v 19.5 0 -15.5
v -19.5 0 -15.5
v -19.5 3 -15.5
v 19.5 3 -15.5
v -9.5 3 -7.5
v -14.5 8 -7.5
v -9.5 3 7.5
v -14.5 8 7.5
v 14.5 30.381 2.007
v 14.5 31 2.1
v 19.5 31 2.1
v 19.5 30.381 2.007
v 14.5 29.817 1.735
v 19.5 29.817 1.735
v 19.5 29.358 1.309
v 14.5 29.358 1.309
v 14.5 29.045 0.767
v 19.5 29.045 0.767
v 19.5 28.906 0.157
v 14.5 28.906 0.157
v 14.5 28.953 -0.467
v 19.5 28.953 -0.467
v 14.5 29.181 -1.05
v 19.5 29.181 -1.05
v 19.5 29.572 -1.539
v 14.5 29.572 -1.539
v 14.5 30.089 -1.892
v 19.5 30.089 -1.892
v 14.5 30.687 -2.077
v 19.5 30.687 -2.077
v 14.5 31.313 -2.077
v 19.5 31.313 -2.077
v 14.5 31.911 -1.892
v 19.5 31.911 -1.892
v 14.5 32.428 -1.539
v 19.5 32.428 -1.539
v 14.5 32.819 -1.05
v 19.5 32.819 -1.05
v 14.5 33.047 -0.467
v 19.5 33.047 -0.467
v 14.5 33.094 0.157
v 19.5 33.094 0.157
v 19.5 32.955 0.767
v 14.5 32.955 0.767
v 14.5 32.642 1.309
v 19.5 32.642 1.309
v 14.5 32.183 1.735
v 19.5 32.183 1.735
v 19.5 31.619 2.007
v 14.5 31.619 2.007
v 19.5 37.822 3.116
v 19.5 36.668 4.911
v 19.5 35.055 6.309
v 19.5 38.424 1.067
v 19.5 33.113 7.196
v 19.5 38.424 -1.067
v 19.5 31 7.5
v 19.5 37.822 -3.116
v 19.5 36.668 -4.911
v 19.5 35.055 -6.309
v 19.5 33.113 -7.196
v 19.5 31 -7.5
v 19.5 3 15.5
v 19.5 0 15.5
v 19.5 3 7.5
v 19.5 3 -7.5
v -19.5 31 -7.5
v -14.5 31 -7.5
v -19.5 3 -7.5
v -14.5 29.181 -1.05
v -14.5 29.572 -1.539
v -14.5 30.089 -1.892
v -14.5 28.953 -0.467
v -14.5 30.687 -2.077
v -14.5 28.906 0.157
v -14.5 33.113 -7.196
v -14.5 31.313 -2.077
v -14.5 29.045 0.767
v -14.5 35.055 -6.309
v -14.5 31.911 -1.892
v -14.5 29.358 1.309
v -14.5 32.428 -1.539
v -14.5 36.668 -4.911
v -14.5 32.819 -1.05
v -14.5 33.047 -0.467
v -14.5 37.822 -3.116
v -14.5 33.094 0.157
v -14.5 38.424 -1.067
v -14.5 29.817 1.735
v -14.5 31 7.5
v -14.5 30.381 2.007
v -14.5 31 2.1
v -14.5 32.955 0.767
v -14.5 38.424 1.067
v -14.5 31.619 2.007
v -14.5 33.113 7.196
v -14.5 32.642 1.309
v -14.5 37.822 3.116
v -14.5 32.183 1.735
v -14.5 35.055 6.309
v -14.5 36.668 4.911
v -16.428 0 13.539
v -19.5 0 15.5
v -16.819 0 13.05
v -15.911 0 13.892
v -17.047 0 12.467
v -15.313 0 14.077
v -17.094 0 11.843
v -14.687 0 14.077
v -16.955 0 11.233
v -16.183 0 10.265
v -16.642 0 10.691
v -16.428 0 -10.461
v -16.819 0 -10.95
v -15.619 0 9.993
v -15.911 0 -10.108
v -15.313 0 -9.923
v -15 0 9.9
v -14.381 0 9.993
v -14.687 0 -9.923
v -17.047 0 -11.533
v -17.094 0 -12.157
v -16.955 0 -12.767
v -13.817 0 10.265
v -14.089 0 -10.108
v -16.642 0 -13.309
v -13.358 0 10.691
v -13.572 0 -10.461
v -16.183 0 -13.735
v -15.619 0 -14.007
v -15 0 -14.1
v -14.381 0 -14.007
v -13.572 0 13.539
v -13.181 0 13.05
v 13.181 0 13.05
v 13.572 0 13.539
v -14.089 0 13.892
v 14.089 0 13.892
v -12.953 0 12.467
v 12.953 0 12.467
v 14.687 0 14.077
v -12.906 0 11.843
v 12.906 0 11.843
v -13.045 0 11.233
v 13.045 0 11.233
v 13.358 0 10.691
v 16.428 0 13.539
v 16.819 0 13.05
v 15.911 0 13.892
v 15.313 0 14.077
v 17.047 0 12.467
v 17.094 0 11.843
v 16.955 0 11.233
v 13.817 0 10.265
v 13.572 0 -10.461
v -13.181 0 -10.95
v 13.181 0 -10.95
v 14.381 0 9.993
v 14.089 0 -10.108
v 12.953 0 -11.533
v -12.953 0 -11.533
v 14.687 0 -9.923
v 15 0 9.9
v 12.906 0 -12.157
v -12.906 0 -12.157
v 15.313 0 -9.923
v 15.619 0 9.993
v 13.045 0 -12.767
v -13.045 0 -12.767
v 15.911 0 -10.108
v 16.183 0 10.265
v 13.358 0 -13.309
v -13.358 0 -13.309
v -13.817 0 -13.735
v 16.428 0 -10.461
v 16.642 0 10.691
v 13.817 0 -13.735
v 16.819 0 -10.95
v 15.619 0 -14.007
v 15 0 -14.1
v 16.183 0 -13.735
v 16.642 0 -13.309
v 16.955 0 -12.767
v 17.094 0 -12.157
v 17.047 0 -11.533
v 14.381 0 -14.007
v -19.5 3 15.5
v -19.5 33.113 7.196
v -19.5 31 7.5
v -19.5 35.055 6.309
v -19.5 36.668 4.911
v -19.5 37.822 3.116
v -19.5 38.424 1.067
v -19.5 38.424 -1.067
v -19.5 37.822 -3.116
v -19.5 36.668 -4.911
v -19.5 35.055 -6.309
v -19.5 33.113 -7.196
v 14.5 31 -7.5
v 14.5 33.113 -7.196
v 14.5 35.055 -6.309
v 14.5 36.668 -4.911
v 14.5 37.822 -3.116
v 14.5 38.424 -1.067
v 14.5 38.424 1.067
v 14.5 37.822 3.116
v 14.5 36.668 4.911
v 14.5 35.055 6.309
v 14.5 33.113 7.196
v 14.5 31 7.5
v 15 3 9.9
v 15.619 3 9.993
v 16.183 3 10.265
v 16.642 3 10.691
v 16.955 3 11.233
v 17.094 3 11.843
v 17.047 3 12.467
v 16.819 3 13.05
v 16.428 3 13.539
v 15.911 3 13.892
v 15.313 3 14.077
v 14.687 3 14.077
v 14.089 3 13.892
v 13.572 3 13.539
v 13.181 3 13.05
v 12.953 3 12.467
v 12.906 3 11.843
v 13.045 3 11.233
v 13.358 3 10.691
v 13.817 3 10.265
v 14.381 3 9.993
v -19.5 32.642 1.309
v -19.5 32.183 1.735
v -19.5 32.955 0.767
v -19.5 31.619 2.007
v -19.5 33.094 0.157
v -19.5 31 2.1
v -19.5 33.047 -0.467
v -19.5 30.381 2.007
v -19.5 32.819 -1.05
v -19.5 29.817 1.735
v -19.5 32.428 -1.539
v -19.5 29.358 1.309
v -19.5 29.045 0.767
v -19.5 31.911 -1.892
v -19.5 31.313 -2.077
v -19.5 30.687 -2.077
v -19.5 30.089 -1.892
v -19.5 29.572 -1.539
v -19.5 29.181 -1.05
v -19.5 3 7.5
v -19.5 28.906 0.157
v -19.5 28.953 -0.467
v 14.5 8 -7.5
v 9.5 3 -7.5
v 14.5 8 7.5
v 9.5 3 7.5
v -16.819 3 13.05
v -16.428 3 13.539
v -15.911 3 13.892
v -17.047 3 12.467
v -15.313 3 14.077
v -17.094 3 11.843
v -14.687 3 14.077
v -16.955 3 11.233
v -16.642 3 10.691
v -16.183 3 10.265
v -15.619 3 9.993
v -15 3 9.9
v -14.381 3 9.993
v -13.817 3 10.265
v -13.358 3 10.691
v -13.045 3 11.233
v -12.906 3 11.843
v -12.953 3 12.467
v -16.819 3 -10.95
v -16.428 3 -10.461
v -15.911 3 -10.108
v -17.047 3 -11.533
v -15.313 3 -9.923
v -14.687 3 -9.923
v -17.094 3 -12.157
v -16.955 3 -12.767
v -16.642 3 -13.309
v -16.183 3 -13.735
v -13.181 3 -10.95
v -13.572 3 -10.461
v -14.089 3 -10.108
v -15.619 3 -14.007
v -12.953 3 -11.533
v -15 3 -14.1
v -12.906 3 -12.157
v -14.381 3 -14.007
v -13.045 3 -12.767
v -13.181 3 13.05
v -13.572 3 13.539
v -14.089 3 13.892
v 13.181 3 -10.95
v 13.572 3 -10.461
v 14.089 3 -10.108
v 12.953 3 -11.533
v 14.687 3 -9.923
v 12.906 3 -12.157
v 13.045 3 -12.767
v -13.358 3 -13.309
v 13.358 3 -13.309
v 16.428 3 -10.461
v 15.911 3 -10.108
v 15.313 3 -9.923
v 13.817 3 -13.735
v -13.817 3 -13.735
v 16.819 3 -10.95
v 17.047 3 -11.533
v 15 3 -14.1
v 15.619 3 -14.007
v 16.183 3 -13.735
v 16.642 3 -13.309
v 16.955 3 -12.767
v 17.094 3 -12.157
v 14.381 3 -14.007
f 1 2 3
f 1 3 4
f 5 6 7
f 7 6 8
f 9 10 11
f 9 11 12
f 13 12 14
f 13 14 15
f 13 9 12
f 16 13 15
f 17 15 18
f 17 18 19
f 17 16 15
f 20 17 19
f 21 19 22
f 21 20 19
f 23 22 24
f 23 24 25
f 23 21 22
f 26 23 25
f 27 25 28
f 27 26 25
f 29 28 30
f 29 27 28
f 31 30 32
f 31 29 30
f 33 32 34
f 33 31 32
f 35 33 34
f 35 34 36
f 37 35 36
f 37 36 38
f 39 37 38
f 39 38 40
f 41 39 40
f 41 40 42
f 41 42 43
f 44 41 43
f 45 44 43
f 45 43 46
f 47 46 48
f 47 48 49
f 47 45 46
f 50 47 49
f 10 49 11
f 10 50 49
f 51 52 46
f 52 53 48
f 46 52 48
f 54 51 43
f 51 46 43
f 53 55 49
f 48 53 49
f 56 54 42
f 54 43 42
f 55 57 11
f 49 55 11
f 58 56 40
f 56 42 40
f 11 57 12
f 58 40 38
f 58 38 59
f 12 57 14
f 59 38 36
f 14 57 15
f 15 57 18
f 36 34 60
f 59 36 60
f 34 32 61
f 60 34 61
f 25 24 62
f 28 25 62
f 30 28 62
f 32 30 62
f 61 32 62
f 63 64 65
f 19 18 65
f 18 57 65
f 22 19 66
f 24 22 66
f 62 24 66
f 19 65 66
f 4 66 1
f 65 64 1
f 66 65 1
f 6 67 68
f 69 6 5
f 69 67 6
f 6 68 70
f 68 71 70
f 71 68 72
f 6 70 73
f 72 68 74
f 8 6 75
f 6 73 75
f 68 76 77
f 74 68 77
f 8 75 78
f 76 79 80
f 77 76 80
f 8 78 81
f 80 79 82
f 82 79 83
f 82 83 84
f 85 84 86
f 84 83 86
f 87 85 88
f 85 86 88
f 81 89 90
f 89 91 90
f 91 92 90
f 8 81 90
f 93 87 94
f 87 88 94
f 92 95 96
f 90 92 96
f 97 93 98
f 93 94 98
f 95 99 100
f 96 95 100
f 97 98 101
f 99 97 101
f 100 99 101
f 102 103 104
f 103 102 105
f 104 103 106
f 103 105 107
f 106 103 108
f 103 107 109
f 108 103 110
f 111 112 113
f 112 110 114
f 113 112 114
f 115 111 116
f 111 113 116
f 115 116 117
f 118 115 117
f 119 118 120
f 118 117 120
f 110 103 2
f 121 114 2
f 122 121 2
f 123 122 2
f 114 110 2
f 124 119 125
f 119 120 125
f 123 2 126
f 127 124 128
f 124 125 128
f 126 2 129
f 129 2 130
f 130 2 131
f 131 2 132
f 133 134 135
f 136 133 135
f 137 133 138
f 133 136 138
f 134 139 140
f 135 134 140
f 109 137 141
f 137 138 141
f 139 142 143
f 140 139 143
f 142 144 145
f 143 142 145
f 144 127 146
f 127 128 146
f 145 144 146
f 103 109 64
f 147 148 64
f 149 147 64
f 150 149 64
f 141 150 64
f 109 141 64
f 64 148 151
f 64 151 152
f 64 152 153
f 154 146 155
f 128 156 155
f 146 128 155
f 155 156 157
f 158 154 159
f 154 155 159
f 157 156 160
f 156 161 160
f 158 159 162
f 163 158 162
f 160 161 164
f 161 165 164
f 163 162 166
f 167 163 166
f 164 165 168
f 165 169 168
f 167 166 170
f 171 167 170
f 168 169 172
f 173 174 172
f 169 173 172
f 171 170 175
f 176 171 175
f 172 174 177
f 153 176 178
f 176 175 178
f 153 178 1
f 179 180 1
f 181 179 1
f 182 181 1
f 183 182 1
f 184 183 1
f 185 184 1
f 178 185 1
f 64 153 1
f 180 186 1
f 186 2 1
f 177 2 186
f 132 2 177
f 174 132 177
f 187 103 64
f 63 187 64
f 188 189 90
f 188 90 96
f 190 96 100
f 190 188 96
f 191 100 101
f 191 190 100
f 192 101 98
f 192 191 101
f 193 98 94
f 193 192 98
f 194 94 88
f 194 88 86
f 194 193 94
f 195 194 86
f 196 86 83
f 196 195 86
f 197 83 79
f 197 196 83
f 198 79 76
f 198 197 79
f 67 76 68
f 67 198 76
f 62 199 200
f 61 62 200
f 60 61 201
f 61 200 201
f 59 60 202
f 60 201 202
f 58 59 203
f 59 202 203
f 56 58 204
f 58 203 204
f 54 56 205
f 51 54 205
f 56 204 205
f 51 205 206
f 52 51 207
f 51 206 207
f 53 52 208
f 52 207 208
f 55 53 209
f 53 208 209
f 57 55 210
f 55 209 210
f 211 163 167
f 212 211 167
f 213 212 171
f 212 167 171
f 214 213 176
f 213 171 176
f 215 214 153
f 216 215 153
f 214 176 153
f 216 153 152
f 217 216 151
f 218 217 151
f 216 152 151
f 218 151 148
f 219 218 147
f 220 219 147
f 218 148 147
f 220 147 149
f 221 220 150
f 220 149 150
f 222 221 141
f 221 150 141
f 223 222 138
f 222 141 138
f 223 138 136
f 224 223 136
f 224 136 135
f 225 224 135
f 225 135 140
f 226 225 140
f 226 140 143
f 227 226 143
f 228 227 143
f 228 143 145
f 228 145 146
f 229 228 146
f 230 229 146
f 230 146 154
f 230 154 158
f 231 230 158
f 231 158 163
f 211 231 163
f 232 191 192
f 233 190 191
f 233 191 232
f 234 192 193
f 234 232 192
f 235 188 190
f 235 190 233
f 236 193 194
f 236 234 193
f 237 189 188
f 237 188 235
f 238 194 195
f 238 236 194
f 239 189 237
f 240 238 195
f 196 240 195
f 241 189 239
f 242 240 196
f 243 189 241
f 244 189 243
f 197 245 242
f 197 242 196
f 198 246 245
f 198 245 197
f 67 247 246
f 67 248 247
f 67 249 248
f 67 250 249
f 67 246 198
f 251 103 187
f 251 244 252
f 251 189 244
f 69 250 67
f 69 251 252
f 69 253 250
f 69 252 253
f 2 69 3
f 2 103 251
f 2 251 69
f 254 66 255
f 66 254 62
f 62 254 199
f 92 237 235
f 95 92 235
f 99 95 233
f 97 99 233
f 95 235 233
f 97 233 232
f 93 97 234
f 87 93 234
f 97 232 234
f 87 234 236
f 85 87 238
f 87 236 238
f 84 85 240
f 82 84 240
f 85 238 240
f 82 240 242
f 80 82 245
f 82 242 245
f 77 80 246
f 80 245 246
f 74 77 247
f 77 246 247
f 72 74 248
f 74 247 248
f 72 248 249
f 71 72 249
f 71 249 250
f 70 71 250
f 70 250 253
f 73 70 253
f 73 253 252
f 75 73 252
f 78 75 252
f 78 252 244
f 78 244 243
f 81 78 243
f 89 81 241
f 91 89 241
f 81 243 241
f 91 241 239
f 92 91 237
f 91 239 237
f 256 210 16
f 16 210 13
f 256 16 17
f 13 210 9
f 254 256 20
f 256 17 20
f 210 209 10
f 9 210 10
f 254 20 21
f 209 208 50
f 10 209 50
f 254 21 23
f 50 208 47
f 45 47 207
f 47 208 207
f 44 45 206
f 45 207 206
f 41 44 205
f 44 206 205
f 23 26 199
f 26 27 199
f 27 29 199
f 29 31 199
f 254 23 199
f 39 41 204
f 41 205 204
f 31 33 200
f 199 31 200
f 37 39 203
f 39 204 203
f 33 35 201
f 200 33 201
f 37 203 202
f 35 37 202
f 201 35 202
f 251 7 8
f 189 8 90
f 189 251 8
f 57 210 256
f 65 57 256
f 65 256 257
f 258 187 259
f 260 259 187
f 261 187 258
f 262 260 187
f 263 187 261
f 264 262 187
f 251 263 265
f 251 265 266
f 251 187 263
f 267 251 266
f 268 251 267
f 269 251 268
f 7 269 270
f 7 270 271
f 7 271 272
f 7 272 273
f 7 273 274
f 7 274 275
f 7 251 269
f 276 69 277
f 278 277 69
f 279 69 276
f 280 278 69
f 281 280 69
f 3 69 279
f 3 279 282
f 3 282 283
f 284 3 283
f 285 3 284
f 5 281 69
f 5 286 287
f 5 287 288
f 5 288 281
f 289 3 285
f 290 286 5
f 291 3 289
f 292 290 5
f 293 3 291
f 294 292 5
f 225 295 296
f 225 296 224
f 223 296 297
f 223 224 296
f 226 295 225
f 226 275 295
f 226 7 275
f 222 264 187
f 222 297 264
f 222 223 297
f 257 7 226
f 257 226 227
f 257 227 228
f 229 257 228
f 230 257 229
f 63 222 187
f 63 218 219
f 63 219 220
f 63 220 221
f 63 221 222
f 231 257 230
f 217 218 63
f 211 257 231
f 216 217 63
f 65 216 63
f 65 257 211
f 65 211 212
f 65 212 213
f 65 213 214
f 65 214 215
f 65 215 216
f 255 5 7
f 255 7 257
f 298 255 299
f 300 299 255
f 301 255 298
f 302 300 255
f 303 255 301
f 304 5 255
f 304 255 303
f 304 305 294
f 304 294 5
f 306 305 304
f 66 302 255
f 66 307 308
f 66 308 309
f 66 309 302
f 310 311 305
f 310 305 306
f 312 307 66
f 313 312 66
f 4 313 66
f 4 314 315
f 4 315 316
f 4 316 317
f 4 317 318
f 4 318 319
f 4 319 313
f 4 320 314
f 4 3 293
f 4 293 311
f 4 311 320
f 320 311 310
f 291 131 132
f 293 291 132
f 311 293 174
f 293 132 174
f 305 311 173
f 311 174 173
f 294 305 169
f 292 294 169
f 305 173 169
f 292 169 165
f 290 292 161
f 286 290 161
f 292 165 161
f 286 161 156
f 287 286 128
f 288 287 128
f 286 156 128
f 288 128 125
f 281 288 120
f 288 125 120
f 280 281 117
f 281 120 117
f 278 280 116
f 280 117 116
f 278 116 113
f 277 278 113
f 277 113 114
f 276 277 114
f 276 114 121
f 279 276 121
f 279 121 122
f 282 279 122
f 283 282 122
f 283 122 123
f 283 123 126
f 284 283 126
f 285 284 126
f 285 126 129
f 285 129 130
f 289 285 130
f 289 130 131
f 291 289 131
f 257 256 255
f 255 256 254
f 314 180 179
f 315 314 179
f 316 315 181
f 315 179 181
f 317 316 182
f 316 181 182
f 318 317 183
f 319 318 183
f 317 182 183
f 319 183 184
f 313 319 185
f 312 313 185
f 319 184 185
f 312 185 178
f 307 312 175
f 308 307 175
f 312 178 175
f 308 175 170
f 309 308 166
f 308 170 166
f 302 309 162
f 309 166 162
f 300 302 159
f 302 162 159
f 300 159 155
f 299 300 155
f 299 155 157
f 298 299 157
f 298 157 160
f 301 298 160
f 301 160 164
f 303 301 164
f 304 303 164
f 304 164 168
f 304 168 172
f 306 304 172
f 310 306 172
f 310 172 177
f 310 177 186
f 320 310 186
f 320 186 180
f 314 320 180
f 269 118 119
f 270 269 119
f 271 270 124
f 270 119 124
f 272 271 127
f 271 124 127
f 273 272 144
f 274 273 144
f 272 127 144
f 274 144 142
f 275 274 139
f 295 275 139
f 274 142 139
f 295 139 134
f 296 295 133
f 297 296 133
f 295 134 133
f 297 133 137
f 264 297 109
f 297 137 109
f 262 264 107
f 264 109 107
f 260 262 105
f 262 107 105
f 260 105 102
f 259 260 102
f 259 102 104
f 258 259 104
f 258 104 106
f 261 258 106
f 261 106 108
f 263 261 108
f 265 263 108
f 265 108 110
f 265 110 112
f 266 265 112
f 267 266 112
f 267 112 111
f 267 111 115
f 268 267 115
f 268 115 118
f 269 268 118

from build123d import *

# Parameters (mm, degrees)
SKETCH_1_W          = 39
SKETCH_1_H          = 31
EXTRUDE_1_DEPTH     = 3
SKETCH_5_R          = 2.1
EXTRUDE_2_DEPTH     = 5
EXTRUDE_START       = -5
SKETCH_6_R          = 2.1
EXTRUDE_3_DEPTH     = 5
SKETCH_8_R          = 2.1
CUT_EXTRUDE_1_DEPTH = 46.855752093
CHAMFER_1_SIZE      = 5


with BuildPart() as part:
    # 草图1 → 凸台-拉伸1 (new body)
    with BuildSketch(Plane(origin=(0, 0, 0), x_dir=(1, 0, 0), z_dir=(0, 1, 0))):
        Rectangle(SKETCH_1_W, SKETCH_1_H)
    extrude(amount=EXTRUDE_1_DEPTH)

    # 草图5 → 凸台-拉伸2 (add)
    with BuildSketch(Plane.ZY.offset(19.5)):
        with BuildLine():
            ThreePointArc((7.5, 31), (0, 38.5), (-7.5, 31))
            Line((-7.5, 31), (-7.5, 3))
            Line((-7.5, 3), (7.5, 3))
            Line((7.5, 3), (7.5, 31))
        make_face()
        with Locations((0, 31)):
            Circle(SKETCH_5_R, mode=Mode.SUBTRACT)
    extrude(amount=-EXTRUDE_2_DEPTH)

    # 草图6 → 凸台-拉伸3 (add)
    with BuildSketch(Plane(origin=(19.5, 0, 0), x_dir=(0, 0, -1), z_dir=(1, 0, 0)).offset(EXTRUDE_START)):
        with BuildLine():
            Line((-7.5, 31), (-7.5, 3))
            Line((-7.5, 3), (7.5, 3))
            Line((7.5, 3), (7.5, 31))
            ThreePointArc((7.5, 31), (0, 38.5), (-7.5, 31))
        make_face()
        with Locations(Location((0, 31, 0), (0, 0, 180))):
            Circle(SKETCH_6_R, mode=Mode.SUBTRACT)
    extrude(amount=EXTRUDE_3_DEPTH)

    # 草图8 → 切除-拉伸1 (cut, through all)
    with BuildSketch(Plane.XZ):
        with Locations(Location((15, 12, 0), (0, 0, 270))):
            Circle(SKETCH_8_R)
        with Locations(Location((15, -12, 0), (0, 0, 270))):
            Circle(SKETCH_8_R)
        with Locations(Location((-15, 12, 0), (0, 0, 270))):
            Circle(SKETCH_8_R)
        with Locations(Location((-15, -12, 0), (0, 0, 270))):
            Circle(SKETCH_8_R)
    extrude(amount=-CUT_EXTRUDE_1_DEPTH, mode=Mode.SUBTRACT)

    # 倒角1
    chamfer_1_edges = [part.edges().sort_by_distance(p)[0] for p in [
        (-14.5, 3, 0),
        (14.5, 3, 0),
    ]]
    chamfer(chamfer_1_edges, length=CHAMFER_1_SIZE)


solid = part.part
